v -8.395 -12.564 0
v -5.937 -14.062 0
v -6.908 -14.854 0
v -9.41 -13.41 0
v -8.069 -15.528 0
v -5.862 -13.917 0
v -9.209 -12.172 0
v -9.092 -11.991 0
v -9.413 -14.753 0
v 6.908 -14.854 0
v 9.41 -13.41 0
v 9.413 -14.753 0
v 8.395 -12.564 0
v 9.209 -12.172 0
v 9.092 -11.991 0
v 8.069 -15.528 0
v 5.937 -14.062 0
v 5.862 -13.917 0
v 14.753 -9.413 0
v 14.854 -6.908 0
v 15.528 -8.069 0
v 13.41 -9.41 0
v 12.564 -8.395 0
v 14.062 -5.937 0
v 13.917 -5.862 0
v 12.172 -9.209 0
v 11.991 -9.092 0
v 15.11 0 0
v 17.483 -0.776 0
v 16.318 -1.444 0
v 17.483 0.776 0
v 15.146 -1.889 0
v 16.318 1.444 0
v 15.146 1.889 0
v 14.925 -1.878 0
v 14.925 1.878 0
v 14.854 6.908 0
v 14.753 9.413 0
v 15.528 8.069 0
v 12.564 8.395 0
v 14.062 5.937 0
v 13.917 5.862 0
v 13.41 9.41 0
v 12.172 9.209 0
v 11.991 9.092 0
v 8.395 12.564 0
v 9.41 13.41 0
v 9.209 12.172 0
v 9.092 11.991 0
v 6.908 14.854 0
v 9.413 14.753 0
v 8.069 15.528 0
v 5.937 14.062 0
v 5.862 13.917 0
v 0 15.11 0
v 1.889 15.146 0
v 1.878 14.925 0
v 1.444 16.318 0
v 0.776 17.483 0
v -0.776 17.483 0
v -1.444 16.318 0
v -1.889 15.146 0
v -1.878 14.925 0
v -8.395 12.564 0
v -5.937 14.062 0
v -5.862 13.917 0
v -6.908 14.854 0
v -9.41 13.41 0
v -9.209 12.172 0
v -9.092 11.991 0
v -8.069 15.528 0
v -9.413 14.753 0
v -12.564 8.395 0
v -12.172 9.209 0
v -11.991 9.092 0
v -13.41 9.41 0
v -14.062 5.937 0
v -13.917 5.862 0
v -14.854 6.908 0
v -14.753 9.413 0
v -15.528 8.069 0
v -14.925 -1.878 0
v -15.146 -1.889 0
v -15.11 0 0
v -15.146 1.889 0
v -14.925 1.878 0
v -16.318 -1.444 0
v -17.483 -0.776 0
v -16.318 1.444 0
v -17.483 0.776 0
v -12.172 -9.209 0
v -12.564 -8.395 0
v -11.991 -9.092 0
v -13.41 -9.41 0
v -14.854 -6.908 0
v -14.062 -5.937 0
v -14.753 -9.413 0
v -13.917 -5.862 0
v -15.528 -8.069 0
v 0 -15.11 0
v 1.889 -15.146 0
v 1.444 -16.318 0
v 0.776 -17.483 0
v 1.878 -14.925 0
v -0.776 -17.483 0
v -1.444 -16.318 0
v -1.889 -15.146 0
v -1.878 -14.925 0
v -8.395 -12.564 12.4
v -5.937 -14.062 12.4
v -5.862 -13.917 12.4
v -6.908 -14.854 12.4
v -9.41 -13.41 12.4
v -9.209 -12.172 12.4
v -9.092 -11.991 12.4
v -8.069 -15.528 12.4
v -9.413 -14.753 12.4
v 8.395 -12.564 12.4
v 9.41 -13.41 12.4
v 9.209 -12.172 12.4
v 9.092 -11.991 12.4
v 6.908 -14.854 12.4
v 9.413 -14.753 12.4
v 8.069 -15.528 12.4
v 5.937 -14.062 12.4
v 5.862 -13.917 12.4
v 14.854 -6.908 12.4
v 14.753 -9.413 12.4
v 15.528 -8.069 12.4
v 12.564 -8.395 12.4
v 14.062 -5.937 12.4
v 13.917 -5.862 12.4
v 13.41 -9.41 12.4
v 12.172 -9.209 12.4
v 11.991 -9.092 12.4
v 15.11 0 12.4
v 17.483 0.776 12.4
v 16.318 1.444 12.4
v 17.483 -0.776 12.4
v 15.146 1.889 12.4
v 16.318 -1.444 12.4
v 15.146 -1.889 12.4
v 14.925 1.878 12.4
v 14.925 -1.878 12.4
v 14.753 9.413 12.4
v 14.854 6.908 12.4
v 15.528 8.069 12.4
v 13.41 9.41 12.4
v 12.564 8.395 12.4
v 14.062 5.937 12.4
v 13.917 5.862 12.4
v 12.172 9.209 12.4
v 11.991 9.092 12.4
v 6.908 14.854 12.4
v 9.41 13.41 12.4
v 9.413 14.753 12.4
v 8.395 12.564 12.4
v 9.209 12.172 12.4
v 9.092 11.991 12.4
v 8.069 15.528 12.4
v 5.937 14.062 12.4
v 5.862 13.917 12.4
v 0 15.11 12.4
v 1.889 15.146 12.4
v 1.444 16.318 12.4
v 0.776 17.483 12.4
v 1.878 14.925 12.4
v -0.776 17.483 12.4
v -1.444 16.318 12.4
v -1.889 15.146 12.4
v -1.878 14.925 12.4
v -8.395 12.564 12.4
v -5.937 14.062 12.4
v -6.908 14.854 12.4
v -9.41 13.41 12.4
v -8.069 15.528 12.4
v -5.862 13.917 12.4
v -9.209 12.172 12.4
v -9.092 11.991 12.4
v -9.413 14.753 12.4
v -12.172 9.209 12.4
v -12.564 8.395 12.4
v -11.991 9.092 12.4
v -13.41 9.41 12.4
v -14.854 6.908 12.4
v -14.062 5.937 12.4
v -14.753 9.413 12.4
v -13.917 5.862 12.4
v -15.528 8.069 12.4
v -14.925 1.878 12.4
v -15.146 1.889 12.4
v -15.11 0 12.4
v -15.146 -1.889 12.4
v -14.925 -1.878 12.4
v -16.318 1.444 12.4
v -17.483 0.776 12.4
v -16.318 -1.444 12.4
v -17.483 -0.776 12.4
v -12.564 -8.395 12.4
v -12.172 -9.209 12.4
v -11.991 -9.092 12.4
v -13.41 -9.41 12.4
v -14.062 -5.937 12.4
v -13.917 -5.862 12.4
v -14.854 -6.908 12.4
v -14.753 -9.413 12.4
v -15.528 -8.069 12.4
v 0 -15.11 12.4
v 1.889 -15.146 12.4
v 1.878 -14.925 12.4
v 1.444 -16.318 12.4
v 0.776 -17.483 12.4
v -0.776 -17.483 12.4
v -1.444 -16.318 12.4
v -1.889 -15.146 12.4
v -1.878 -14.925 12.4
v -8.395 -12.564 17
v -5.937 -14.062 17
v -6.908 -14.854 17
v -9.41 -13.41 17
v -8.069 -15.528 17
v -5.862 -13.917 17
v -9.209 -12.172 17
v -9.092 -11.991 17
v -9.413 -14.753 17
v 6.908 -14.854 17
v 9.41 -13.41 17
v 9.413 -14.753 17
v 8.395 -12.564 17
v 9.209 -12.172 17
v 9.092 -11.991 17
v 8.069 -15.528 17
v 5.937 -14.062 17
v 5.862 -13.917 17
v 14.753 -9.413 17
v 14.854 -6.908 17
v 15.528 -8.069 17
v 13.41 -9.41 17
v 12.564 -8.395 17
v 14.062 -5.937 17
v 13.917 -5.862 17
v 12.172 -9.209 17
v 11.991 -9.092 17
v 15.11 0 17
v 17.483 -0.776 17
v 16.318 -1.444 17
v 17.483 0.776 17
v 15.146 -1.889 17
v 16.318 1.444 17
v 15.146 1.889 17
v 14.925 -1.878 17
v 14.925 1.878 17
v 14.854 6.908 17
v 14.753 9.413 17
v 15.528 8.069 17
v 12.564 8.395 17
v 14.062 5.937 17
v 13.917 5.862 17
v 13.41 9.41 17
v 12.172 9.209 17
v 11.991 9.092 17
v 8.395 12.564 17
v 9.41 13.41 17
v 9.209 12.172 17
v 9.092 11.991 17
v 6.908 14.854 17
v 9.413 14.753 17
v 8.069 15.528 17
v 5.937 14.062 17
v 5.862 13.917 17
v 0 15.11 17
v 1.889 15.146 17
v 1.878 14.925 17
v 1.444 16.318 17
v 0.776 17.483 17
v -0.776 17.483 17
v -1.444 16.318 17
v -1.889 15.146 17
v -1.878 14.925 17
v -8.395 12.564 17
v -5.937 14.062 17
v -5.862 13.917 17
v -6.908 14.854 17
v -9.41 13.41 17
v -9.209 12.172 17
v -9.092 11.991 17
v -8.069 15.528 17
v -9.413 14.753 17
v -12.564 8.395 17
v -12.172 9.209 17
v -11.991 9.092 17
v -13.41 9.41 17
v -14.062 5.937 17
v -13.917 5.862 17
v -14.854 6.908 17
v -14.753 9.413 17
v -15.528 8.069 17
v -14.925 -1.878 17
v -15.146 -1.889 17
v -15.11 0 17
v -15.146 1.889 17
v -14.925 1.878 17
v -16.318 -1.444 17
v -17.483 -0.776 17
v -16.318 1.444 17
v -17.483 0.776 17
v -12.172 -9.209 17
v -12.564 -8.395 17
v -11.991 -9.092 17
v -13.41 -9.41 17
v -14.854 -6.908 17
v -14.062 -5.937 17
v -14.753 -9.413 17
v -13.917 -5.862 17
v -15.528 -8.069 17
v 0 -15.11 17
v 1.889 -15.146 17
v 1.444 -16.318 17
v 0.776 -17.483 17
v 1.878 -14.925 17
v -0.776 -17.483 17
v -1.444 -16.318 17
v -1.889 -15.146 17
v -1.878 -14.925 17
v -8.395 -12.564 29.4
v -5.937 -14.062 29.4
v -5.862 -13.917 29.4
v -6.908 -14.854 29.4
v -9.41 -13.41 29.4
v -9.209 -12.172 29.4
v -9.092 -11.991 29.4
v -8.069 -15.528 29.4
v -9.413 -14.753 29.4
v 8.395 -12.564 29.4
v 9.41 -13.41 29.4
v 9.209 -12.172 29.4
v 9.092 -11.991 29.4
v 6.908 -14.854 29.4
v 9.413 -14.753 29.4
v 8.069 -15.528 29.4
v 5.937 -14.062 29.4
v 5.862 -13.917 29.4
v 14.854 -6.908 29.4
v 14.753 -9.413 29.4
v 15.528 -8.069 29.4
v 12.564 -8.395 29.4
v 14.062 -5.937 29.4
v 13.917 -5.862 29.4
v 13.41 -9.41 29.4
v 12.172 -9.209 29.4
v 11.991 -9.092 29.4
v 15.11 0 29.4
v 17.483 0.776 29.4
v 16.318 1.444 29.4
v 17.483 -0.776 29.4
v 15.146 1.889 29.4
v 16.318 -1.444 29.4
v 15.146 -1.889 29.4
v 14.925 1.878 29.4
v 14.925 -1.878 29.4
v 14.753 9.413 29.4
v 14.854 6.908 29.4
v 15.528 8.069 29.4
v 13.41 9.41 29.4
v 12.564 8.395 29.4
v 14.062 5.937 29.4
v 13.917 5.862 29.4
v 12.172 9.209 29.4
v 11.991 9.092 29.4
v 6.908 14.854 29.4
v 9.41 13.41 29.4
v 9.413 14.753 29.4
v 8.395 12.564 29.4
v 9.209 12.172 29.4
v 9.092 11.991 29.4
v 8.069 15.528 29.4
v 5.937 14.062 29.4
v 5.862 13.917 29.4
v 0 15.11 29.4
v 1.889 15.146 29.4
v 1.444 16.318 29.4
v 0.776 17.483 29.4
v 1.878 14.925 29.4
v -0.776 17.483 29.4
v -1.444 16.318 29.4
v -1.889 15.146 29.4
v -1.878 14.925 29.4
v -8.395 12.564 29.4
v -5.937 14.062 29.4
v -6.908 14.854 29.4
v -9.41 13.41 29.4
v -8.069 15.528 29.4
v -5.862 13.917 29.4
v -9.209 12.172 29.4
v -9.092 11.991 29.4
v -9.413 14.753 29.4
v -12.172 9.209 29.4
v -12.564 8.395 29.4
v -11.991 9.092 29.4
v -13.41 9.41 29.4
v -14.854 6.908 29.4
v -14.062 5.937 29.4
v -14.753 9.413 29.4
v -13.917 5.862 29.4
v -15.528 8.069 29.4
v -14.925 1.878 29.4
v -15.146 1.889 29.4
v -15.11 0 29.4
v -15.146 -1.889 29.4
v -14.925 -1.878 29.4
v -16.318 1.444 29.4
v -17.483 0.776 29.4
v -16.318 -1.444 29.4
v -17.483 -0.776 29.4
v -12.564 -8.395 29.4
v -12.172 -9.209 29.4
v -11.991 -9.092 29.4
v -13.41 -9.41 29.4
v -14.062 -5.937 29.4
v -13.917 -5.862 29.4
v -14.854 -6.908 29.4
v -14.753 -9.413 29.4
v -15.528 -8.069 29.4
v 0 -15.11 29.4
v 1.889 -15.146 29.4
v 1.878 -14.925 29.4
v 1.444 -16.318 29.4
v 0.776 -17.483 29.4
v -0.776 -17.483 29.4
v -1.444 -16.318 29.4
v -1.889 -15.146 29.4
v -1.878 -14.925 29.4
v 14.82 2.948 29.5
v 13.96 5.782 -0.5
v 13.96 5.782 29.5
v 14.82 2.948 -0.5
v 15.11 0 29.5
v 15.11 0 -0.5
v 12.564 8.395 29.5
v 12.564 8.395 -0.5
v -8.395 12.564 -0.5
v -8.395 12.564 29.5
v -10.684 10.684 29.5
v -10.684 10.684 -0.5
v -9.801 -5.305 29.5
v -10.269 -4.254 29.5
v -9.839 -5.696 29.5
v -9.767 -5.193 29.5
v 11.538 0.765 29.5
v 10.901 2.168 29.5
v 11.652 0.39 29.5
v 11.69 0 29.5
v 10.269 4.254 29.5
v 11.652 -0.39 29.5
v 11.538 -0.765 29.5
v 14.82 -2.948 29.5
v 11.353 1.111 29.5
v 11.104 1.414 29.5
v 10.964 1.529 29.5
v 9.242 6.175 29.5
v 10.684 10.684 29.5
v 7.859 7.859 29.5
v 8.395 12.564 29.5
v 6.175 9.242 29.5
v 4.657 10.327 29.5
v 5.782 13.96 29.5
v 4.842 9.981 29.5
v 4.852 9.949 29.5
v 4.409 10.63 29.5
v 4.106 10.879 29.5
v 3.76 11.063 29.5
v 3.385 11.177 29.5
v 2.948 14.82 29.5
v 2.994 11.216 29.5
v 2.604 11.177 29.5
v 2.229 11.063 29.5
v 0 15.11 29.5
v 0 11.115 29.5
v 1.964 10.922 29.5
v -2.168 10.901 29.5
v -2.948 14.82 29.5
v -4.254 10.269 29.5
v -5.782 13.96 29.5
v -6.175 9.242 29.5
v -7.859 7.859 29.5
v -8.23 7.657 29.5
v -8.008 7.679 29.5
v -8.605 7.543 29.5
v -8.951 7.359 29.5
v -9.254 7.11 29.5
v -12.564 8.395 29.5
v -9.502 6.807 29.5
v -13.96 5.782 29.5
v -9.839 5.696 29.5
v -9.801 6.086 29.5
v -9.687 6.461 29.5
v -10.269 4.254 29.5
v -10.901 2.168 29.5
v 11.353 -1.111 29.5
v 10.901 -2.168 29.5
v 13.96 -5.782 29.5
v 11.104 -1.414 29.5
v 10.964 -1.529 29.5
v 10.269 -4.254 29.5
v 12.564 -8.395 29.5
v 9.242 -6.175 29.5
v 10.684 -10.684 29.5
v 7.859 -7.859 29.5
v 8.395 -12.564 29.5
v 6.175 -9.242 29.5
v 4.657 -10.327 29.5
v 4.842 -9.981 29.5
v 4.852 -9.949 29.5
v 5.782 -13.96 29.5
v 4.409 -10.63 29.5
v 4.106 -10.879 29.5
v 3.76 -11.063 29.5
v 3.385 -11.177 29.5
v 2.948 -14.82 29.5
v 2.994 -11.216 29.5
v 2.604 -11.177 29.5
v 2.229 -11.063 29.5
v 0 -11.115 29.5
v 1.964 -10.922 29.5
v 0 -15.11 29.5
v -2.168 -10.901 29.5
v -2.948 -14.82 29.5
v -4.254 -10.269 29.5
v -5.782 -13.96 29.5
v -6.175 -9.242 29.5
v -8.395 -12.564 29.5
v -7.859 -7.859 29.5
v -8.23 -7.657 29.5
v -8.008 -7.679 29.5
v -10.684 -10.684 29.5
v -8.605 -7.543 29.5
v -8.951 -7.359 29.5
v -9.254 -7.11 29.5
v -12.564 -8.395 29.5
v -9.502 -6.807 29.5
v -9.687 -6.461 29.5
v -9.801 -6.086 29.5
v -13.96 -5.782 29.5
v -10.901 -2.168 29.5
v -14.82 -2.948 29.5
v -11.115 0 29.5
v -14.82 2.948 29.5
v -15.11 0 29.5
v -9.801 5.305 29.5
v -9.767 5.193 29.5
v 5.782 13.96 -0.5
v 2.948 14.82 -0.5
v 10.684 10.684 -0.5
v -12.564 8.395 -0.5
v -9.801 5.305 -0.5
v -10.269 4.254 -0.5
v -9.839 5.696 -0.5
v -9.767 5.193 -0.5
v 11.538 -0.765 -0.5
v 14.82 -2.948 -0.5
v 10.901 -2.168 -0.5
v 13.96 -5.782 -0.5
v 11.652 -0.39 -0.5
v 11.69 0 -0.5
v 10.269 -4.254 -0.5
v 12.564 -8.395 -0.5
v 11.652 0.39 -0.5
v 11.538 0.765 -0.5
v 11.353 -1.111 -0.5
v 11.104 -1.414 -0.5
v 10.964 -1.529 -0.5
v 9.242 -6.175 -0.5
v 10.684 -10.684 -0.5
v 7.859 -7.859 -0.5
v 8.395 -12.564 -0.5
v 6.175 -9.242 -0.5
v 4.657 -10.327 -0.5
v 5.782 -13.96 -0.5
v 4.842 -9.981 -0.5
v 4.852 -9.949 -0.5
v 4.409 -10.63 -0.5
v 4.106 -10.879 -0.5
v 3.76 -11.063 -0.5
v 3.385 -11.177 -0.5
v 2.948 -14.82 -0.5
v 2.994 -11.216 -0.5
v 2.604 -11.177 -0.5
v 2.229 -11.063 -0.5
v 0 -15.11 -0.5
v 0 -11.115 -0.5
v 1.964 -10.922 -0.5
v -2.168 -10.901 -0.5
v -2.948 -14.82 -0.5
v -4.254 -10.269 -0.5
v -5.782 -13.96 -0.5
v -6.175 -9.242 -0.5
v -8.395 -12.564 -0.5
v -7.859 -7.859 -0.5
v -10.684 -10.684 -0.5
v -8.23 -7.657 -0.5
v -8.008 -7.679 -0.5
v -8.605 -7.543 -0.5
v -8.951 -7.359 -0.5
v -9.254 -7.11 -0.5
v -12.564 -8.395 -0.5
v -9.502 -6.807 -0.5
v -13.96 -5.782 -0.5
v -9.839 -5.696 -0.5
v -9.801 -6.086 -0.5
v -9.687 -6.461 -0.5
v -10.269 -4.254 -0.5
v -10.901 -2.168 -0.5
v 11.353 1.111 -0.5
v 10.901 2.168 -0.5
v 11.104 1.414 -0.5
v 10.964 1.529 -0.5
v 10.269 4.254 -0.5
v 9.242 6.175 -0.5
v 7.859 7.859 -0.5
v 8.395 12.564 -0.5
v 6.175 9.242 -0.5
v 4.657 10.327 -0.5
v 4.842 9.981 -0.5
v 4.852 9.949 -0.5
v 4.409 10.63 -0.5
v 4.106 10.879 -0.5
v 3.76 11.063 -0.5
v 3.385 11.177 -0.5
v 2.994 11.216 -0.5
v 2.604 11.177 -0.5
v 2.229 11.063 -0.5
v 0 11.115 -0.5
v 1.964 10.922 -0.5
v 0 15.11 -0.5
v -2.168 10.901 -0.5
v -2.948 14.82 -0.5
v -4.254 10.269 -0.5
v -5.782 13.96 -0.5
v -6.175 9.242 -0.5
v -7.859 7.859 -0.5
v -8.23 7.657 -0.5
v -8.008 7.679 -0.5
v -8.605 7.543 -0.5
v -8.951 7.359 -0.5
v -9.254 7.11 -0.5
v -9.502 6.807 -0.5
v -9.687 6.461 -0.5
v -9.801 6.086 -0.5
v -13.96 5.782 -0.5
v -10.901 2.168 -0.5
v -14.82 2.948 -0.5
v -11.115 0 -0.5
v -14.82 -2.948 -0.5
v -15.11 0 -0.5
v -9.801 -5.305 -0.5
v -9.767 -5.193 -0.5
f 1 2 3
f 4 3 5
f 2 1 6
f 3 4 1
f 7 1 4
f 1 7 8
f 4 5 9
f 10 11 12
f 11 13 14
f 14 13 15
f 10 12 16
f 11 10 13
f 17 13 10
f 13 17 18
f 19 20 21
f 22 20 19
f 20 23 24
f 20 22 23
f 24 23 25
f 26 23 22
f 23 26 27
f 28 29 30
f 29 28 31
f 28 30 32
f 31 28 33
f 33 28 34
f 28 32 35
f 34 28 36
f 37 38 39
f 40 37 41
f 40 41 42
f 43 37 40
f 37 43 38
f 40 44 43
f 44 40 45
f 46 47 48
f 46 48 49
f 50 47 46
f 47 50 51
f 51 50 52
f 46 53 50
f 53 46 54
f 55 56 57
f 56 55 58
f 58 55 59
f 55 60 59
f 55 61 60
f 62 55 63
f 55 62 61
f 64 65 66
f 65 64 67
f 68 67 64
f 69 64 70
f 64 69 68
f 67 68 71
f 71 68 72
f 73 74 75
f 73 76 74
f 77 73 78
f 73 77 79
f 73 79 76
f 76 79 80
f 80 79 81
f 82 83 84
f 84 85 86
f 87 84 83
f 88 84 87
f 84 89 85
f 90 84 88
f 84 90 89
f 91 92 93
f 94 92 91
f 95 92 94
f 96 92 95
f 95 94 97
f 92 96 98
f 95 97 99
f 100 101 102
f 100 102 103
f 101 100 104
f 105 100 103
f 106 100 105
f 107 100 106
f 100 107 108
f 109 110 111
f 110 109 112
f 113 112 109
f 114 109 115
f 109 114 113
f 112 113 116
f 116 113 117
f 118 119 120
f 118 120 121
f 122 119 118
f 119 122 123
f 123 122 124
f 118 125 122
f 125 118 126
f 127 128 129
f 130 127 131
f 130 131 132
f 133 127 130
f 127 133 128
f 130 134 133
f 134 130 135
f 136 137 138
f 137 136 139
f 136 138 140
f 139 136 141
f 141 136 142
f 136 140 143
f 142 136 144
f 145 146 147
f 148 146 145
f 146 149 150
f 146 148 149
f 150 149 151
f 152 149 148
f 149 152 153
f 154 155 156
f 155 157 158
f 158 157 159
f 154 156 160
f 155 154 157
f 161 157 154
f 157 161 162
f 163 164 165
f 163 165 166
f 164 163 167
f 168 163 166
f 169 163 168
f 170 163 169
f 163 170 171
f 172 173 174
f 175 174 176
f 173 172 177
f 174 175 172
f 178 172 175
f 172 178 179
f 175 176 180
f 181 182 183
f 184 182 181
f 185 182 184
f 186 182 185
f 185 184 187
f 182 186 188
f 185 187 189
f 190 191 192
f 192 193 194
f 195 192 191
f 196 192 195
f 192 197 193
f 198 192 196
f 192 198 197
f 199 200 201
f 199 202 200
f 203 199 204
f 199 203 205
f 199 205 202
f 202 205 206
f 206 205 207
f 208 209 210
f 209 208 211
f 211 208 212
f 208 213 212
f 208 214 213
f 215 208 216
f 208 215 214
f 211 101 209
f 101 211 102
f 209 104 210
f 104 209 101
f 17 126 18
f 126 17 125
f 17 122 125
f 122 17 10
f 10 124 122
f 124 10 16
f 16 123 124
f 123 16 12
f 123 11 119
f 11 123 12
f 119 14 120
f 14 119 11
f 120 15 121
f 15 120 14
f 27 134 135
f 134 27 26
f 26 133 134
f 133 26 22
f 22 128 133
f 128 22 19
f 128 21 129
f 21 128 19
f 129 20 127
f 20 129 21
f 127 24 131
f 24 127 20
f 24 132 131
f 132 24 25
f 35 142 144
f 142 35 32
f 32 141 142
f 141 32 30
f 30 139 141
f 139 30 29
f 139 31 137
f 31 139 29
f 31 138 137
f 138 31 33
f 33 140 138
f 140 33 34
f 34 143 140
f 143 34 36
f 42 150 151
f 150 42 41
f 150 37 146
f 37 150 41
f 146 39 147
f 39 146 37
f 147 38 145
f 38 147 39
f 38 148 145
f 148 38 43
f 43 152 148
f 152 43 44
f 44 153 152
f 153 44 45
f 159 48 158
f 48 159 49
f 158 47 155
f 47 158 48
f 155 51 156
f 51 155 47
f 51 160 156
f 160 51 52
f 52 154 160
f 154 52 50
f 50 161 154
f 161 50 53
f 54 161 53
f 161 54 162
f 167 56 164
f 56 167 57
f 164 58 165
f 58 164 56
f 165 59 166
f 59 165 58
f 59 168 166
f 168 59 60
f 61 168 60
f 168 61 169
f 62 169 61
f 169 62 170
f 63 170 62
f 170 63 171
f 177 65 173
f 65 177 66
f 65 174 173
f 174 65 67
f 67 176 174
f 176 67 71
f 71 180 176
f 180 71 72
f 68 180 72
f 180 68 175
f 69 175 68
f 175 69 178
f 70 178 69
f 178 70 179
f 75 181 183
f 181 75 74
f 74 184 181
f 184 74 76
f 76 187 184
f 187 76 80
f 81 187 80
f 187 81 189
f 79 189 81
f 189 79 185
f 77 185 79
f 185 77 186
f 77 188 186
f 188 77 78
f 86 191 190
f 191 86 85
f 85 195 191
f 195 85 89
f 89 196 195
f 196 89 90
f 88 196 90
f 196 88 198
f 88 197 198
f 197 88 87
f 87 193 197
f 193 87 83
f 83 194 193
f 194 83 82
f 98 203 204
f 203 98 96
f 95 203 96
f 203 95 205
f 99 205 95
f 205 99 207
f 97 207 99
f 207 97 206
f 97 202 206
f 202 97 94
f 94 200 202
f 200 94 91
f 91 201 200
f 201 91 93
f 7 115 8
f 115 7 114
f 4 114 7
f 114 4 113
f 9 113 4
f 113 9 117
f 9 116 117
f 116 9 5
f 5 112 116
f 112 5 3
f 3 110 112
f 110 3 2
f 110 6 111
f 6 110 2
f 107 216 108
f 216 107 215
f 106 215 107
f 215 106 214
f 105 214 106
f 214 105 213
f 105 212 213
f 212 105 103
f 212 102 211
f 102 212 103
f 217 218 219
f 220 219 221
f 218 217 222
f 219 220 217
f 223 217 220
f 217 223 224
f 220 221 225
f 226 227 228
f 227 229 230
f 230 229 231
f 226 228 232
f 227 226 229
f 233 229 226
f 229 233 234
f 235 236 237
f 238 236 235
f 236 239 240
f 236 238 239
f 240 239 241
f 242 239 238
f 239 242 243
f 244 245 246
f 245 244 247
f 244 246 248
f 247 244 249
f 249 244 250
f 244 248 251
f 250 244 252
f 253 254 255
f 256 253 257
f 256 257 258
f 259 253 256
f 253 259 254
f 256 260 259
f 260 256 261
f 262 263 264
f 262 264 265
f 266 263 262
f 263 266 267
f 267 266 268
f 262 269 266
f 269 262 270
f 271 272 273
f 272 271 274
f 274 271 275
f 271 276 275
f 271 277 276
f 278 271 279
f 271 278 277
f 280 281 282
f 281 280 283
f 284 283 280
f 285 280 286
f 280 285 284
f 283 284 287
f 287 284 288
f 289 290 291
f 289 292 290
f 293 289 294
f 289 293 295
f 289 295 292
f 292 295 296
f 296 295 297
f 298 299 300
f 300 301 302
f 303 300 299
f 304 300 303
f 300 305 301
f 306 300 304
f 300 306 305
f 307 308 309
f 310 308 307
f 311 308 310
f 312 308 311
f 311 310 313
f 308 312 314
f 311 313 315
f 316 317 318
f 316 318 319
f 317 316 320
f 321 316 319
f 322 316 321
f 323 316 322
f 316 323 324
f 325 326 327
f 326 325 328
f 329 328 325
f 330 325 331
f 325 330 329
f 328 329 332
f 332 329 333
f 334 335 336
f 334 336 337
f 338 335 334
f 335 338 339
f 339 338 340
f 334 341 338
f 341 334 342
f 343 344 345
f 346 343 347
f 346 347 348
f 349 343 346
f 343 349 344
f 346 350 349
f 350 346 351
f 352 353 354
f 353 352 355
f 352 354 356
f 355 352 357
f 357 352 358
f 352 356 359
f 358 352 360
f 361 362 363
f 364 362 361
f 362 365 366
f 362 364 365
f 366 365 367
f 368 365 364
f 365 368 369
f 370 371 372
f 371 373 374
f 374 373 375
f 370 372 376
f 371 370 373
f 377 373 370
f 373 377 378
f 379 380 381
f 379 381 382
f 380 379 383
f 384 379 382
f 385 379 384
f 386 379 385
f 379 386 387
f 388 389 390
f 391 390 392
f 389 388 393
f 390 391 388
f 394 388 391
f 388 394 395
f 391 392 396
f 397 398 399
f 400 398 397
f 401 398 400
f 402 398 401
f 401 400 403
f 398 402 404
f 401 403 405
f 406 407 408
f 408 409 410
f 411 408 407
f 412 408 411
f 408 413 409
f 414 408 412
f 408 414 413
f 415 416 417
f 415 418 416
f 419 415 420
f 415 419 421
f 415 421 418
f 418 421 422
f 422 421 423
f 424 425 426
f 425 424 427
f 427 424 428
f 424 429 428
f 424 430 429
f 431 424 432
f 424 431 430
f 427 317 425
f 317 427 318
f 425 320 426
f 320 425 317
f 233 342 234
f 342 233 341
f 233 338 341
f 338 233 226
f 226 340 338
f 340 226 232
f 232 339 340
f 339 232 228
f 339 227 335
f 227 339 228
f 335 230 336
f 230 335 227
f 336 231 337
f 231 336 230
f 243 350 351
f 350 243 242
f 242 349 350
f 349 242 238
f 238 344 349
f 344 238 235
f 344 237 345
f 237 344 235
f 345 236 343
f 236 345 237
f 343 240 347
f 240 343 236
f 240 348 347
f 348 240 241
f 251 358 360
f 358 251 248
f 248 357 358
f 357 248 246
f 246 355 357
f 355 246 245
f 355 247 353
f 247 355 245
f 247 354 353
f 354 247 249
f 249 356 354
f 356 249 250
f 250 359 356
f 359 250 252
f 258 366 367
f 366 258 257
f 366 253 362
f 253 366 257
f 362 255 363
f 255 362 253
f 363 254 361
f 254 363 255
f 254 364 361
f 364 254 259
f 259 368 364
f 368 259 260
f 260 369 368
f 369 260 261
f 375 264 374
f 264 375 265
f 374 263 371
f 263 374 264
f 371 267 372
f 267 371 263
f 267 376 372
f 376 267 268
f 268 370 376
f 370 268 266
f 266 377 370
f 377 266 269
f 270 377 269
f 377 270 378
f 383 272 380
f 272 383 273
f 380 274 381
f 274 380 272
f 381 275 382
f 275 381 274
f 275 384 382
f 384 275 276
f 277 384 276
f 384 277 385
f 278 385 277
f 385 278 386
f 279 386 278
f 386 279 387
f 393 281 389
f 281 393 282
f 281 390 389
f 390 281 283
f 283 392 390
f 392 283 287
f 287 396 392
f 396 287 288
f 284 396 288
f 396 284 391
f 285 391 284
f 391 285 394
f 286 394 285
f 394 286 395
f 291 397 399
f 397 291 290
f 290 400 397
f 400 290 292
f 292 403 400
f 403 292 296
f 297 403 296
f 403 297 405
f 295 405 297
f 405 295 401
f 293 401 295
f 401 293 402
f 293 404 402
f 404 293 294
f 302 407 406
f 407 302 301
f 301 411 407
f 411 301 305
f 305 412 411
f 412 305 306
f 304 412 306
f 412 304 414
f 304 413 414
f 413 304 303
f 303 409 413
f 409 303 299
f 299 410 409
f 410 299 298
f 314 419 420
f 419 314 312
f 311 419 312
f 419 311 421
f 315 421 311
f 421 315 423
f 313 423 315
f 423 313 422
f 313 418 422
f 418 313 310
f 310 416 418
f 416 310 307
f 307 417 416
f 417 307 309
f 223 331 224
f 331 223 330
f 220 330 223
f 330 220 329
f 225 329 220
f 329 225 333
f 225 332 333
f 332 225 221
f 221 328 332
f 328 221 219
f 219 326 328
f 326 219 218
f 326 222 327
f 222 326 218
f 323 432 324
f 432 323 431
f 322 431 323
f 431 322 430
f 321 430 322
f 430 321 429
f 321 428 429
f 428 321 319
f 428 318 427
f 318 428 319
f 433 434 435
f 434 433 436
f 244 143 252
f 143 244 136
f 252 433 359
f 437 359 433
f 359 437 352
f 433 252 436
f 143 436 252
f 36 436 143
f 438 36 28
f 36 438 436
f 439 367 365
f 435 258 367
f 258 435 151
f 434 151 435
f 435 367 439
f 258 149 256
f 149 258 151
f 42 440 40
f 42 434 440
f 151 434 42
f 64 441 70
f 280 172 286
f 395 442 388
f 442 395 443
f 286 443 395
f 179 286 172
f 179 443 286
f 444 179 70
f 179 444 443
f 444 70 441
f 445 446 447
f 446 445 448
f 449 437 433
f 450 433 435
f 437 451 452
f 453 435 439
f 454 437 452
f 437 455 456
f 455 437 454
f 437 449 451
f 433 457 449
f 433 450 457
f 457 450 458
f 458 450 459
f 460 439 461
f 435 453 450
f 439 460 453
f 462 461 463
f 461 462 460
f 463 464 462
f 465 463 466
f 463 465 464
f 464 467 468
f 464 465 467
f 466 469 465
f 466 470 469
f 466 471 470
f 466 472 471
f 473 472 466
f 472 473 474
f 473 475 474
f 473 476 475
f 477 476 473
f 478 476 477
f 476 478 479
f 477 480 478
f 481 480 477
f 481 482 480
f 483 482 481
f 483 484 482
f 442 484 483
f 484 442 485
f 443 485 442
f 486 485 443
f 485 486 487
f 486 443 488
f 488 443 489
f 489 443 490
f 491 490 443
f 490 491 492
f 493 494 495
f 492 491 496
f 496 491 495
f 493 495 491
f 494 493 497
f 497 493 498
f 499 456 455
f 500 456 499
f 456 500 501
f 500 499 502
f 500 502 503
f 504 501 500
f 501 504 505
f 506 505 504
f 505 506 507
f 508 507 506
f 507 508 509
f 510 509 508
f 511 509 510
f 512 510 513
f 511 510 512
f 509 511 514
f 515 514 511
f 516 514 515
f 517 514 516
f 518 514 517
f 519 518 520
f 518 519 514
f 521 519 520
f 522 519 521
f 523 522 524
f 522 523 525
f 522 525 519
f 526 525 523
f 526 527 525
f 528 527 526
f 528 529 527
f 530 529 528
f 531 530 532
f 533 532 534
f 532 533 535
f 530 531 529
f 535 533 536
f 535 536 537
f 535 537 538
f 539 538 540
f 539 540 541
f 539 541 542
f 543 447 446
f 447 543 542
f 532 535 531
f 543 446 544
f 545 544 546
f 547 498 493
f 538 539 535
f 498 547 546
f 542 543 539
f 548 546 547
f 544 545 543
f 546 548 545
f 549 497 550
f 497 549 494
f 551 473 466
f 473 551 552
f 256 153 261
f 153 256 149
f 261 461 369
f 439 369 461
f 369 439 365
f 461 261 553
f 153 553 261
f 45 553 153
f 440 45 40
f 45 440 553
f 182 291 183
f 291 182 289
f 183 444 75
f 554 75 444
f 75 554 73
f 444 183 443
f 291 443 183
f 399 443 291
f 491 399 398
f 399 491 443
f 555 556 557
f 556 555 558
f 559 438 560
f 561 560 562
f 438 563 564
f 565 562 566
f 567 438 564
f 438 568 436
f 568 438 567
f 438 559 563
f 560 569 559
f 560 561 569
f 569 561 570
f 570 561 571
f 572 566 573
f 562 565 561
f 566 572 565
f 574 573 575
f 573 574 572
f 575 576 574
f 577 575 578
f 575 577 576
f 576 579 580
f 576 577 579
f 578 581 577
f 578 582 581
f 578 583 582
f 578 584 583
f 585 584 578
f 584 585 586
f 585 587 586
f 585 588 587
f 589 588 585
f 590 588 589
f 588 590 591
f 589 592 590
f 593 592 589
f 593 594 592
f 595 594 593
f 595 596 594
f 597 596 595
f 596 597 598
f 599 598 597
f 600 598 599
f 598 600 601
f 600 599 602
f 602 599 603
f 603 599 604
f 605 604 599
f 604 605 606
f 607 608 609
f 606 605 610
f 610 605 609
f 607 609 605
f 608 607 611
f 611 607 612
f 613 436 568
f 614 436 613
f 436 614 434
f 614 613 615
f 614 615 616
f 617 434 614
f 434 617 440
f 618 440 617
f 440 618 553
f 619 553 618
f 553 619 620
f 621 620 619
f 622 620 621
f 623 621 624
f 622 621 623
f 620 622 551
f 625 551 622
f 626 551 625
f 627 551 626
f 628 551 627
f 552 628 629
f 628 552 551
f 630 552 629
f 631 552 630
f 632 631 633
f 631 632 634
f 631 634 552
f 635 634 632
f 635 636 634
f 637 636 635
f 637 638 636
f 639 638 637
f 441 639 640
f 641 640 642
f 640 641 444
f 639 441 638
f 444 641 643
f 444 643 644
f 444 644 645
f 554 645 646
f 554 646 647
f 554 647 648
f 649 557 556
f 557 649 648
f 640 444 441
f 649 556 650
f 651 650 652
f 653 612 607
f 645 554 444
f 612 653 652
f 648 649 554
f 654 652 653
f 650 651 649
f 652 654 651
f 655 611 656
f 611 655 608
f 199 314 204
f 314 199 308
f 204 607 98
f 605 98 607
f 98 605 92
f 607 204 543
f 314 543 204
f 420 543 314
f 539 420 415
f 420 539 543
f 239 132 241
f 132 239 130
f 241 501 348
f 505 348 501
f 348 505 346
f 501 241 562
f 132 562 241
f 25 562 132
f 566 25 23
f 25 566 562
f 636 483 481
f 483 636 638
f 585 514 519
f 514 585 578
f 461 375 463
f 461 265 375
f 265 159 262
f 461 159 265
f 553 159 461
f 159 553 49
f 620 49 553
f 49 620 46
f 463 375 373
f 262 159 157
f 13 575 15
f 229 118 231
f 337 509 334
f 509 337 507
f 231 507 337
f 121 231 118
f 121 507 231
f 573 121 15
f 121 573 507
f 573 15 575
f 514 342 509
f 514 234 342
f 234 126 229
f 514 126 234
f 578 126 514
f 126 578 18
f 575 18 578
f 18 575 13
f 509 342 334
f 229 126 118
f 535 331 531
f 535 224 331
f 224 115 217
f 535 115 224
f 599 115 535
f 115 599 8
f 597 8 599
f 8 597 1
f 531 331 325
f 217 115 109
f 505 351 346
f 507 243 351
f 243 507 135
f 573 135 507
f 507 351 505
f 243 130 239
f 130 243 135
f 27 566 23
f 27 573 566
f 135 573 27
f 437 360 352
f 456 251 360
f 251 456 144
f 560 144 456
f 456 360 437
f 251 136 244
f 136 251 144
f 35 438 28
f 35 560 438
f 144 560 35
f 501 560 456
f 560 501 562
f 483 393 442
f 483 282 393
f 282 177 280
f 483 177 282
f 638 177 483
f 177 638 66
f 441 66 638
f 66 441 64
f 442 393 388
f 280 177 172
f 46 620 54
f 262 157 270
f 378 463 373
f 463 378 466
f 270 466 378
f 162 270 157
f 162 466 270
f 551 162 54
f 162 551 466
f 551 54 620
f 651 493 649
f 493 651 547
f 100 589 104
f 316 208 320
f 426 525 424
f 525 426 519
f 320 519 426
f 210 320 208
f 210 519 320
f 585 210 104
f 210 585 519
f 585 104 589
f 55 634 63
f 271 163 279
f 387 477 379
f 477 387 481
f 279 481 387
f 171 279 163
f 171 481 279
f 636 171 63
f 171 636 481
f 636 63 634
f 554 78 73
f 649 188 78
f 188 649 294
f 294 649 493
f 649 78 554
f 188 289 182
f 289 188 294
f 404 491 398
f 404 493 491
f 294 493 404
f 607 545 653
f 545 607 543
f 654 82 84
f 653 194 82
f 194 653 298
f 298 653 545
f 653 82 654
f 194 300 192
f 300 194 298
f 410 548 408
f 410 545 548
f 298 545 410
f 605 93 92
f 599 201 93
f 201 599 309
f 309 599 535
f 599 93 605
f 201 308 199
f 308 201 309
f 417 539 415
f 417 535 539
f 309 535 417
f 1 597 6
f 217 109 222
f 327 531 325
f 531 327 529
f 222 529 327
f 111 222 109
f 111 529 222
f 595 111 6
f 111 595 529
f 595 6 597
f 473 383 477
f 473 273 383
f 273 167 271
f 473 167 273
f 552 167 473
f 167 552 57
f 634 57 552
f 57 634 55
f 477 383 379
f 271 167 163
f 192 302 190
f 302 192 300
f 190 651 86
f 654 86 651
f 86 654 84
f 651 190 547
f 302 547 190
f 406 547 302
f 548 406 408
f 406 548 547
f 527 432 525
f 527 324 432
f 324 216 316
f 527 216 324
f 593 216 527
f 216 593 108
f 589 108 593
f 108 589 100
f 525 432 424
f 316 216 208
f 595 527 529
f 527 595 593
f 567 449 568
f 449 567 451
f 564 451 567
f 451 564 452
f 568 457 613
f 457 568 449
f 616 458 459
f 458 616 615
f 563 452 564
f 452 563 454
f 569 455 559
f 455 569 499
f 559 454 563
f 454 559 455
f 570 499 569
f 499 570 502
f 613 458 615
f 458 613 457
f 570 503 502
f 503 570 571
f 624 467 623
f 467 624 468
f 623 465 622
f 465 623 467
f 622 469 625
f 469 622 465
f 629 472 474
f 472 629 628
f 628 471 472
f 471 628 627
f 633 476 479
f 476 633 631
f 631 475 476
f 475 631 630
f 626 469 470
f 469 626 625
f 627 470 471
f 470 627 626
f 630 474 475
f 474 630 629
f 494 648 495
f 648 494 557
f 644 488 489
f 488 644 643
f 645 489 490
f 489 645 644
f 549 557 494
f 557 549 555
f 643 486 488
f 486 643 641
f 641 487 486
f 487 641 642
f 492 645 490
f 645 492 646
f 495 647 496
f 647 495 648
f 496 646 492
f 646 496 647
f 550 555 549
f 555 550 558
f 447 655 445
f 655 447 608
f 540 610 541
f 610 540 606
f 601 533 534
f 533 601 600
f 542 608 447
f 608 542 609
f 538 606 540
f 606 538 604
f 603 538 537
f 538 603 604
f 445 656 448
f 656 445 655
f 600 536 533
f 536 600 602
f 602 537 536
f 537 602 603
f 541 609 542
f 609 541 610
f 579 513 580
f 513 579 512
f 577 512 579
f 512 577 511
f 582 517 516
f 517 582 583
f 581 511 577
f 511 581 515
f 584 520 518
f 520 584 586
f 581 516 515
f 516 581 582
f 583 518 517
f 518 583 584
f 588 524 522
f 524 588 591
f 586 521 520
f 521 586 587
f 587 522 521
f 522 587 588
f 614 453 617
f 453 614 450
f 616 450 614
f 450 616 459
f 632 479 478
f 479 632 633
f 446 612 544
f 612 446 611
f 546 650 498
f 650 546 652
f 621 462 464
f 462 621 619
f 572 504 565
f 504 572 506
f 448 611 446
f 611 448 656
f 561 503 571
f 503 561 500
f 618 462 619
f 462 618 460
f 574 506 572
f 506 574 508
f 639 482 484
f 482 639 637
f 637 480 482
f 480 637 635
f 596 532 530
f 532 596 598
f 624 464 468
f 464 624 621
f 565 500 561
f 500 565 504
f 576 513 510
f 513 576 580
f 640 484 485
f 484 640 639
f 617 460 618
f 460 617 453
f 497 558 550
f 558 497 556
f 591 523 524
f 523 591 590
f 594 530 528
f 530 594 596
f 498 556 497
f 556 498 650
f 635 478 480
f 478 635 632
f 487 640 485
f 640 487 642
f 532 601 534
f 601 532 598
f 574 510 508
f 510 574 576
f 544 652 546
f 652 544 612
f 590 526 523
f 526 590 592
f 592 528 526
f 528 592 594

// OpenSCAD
$fn = 32;

// ----------------------------------------------------------------------
// Two-module gear rim: z12 m2.5 and z12 m2.5, 29 mm wide
// ----------------------------------------------------------------------

// --- parameters (mm) ---
module_a = 2.5;           // first tooth module
teeth_a = 12;             // first band tooth count
module_b = 2.5;           // second tooth module
teeth_b = 12;             // second band tooth count
band_h = 12;              // height of one tooth band
web_t = 5;                // web thickness between the bands
total = 29;               // overall width over both bands
root_r = 11.88;           // root radius of the coarse band
hub_r = 15.11;            // hub radius
bore_d = 22.23;           // hub bore
hole_count = 5;           // lightening holes
hole_r = 9.69;            // lightening hole circle radius
hole_d = 4;               // lightening hole diameter

band_a = [[11.749, -1.723], [15.146, -1.889], [16.318, -1.444], [17.483, -0.776], [17.483, 0.776], [16.318, 1.444], [15.146, 1.889], [11.749, 1.723], [11.037, 4.383], [14.062, 5.937], [14.854, 6.908], [15.528, 8.069], [14.753, 9.413], [13.41, 9.41], [12.172, 9.209], [9.314, 7.367], [7.367, 9.314], [9.209, 12.172], [9.41, 13.41], [9.413, 14.753], [8.069, 15.528], [6.908, 14.854], [5.937, 14.062], [4.383, 11.037], [1.723, 11.749], [1.889, 15.146], [1.444, 16.318], [0.776, 17.483], [-0.776, 17.483], [-1.444, 16.318], [-1.889, 15.146], [-1.723, 11.749], [-4.383, 11.037], [-5.937, 14.062], [-6.908, 14.854], [-8.069, 15.528], [-9.413, 14.753], [-9.41, 13.41], [-9.209, 12.172], [-7.367, 9.314], [-9.314, 7.367], [-12.172, 9.209], [-13.41, 9.41], [-14.753, 9.413], [-15.528, 8.069], [-14.854, 6.908], [-14.062, 5.937], [-11.037, 4.383], [-11.749, 1.723], [-15.146, 1.889], [-16.318, 1.444], [-17.483, 0.776], [-17.483, -0.776], [-16.318, -1.444], [-15.146, -1.889], [-11.749, -1.723], [-11.037, -4.383], [-14.062, -5.937], [-14.854, -6.908], [-15.528, -8.069], [-14.753, -9.413], [-13.41, -9.41], [-12.172, -9.209], [-9.314, -7.367], [-7.367, -9.314], [-9.209, -12.172], [-9.41, -13.41], [-9.413, -14.753], [-8.069, -15.528], [-6.908, -14.854], [-5.937, -14.062], [-4.383, -11.037], [-1.723, -11.749], [-1.889, -15.146], [-1.444, -16.318], [-0.776, -17.483], [0.776, -17.483], [1.444, -16.318], [1.889, -15.146], [1.723, -11.749], [4.383, -11.037], [5.937, -14.062], [6.908, -14.854], [8.069, -15.528], [9.413, -14.753], [9.41, -13.41], [9.209, -12.172], [7.367, -9.314], [9.314, -7.367], [12.172, -9.209], [13.41, -9.41], [14.753, -9.413], [15.528, -8.069], [14.854, -6.908], [14.062, -5.937], [11.037, -4.383]];
band_b = [[11.749, -1.723], [15.146, -1.889], [16.318, -1.444], [17.483, -0.776], [17.483, 0.776], [16.318, 1.444], [15.146, 1.889], [11.749, 1.723], [11.037, 4.383], [14.062, 5.937], [14.854, 6.908], [15.528, 8.069], [14.753, 9.413], [13.41, 9.41], [12.172, 9.209], [9.314, 7.367], [7.367, 9.314], [9.209, 12.172], [9.41, 13.41], [9.413, 14.753], [8.069, 15.528], [6.908, 14.854], [5.937, 14.062], [4.383, 11.037], [1.723, 11.749], [1.889, 15.146], [1.444, 16.318], [0.776, 17.483], [-0.776, 17.483], [-1.444, 16.318], [-1.889, 15.146], [-1.723, 11.749], [-4.383, 11.037], [-5.937, 14.062], [-6.908, 14.854], [-8.069, 15.528], [-9.413, 14.753], [-9.41, 13.41], [-9.209, 12.172], [-7.367, 9.314], [-9.314, 7.367], [-12.172, 9.209], [-13.41, 9.41], [-14.753, 9.413], [-15.528, 8.069], [-14.854, 6.908], [-14.062, 5.937], [-11.037, 4.383], [-11.749, 1.723], [-15.146, 1.889], [-16.318, 1.444], [-17.483, 0.776], [-17.483, -0.776], [-16.318, -1.444], [-15.146, -1.889], [-11.749, -1.723], [-11.037, -4.383], [-14.062, -5.937], [-14.854, -6.908], [-15.528, -8.069], [-14.753, -9.413], [-13.41, -9.41], [-12.172, -9.209], [-9.314, -7.367], [-7.367, -9.314], [-9.209, -12.172], [-9.41, -13.41], [-9.413, -14.753], [-8.069, -15.528], [-6.908, -14.854], [-5.937, -14.062], [-4.383, -11.037], [-1.723, -11.749], [-1.889, -15.146], [-1.444, -16.318], [-0.776, -17.483], [0.776, -17.483], [1.444, -16.318], [1.889, -15.146], [1.723, -11.749], [4.383, -11.037], [5.937, -14.062], [6.908, -14.854], [8.069, -15.528], [9.413, -14.753], [9.41, -13.41], [9.209, -12.172], [7.367, -9.314], [9.314, -7.367], [12.172, -9.209], [13.41, -9.41], [14.753, -9.413], [15.528, -8.069], [14.854, -6.908], [14.062, -5.937], [11.037, -4.383]];

difference() {
  union() {
    /* tooth band A, overlapping the web by 0.4 mm */
    linear_extrude(height = band_h + 0.4) polygon(band_a);
    /* web */
    translate([0, 0, band_h - 0.4]) cylinder(h = web_t + 0.8, d = 2 * root_r);
    /* tooth band B */
    translate([0, 0, band_h + web_t]) linear_extrude(height = band_h + 0.4) polygon(band_b);
    /* hub */
    translate([0, 0, -0.5]) cylinder(h = total + 1.0, d = 2 * hub_r);
  }
  /* bore */
  translate([0, 0, -2.5]) cylinder(h = total + 5, d = bore_d);
  /* lightening holes through the web */
  for (i = [0 : hole_count - 1]) {
    a = i * 360 / hole_count;
    translate([hole_r * cos(a), hole_r * sin(a), -2.5]) cylinder(h = total + 5, d = hole_d);
  }
}
